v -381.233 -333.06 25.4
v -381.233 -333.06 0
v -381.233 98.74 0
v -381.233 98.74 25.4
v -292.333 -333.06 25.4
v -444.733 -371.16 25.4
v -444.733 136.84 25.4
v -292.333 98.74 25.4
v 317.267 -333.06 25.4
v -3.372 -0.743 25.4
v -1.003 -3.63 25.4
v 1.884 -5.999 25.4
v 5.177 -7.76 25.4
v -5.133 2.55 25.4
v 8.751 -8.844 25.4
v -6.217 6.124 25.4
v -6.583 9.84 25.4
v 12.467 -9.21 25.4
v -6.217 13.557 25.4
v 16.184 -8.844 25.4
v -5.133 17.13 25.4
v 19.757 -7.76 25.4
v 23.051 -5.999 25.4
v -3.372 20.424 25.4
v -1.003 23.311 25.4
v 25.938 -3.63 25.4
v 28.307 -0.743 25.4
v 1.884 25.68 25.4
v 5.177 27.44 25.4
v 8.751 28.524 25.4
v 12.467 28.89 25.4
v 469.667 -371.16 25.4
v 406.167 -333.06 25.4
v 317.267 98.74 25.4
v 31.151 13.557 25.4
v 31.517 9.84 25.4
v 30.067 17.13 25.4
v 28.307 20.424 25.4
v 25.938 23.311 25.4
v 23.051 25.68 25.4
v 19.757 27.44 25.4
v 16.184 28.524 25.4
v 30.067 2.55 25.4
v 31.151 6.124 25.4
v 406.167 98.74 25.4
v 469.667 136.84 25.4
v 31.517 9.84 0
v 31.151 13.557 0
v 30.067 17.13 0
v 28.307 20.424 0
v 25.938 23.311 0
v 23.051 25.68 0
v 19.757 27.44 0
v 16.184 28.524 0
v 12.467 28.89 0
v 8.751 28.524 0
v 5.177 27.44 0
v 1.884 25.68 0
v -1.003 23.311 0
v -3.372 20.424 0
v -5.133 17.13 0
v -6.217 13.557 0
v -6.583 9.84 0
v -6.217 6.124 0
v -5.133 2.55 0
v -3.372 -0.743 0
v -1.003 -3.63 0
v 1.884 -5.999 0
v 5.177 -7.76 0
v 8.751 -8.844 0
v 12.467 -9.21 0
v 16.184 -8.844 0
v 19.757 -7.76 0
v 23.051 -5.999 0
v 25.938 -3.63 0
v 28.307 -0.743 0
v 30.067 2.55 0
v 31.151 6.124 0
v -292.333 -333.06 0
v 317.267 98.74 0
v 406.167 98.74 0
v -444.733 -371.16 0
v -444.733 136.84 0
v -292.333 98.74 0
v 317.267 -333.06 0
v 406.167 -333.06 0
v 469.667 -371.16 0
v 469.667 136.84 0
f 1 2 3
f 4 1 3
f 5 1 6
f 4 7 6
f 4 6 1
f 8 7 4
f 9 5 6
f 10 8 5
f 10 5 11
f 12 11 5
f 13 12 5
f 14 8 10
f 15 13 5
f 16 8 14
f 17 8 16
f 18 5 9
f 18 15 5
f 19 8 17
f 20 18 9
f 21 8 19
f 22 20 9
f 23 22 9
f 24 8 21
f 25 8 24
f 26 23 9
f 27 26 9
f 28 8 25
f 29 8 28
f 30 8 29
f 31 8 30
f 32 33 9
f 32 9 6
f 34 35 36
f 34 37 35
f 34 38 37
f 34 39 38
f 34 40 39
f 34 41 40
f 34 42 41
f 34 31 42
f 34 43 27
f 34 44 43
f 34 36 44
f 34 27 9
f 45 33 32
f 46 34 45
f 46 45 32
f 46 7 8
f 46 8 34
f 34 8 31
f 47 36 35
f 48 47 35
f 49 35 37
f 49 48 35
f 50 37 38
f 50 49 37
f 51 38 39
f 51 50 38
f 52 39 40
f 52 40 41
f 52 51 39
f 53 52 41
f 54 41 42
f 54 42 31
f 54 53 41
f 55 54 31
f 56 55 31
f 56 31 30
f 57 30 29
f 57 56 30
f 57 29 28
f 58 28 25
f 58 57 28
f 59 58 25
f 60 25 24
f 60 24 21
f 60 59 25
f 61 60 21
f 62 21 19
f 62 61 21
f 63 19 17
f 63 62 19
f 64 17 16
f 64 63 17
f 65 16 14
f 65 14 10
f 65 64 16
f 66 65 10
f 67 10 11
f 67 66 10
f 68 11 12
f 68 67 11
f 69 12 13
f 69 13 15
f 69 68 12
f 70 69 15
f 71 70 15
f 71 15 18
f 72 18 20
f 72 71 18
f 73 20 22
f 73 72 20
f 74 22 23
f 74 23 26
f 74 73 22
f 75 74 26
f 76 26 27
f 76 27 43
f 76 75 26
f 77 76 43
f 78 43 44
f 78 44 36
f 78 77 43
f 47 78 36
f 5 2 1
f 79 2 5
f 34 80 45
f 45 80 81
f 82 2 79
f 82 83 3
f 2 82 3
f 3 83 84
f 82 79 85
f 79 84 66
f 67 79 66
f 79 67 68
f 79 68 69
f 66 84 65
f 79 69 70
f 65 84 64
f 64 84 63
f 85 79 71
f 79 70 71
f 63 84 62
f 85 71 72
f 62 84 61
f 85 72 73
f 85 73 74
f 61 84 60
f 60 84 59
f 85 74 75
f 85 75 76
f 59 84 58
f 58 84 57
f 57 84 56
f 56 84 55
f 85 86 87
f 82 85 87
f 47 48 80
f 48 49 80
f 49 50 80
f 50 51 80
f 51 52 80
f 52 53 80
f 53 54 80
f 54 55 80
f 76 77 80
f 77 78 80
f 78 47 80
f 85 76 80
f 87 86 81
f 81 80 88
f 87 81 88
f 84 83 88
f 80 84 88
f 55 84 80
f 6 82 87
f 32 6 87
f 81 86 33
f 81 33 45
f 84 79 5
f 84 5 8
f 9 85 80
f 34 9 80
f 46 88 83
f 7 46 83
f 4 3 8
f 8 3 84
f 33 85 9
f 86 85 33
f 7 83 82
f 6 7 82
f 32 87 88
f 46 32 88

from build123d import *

# Parameters (mm, degrees)
F0_W     = 88.9
F0_H     = 431.8
F0_R     = 19.05
F1_DEPTH = 25.4


with BuildPart() as f1:
    # F0 (on Top) → F1 (new body)
    with BuildSketch(Plane.XY):
        Polygon((469.66731, 136.840239), (-444.73269, 136.840239), (-444.73269, -333.059761), (-444.73269, -371.159761), (469.66731, -371.159761), align=None)
        with Locations((-336.78269, -117.159761)):
            Rectangle(F0_W, F0_H, mode=Mode.SUBTRACT)
        with Locations((12.46731, 9.840239)):
            Circle(F0_R, mode=Mode.SUBTRACT)
        with Locations((361.71731, -117.159761)):
            Rectangle(F0_W, F0_H, mode=Mode.SUBTRACT)
    extrude(amount=F1_DEPTH)


solid = f1.part
